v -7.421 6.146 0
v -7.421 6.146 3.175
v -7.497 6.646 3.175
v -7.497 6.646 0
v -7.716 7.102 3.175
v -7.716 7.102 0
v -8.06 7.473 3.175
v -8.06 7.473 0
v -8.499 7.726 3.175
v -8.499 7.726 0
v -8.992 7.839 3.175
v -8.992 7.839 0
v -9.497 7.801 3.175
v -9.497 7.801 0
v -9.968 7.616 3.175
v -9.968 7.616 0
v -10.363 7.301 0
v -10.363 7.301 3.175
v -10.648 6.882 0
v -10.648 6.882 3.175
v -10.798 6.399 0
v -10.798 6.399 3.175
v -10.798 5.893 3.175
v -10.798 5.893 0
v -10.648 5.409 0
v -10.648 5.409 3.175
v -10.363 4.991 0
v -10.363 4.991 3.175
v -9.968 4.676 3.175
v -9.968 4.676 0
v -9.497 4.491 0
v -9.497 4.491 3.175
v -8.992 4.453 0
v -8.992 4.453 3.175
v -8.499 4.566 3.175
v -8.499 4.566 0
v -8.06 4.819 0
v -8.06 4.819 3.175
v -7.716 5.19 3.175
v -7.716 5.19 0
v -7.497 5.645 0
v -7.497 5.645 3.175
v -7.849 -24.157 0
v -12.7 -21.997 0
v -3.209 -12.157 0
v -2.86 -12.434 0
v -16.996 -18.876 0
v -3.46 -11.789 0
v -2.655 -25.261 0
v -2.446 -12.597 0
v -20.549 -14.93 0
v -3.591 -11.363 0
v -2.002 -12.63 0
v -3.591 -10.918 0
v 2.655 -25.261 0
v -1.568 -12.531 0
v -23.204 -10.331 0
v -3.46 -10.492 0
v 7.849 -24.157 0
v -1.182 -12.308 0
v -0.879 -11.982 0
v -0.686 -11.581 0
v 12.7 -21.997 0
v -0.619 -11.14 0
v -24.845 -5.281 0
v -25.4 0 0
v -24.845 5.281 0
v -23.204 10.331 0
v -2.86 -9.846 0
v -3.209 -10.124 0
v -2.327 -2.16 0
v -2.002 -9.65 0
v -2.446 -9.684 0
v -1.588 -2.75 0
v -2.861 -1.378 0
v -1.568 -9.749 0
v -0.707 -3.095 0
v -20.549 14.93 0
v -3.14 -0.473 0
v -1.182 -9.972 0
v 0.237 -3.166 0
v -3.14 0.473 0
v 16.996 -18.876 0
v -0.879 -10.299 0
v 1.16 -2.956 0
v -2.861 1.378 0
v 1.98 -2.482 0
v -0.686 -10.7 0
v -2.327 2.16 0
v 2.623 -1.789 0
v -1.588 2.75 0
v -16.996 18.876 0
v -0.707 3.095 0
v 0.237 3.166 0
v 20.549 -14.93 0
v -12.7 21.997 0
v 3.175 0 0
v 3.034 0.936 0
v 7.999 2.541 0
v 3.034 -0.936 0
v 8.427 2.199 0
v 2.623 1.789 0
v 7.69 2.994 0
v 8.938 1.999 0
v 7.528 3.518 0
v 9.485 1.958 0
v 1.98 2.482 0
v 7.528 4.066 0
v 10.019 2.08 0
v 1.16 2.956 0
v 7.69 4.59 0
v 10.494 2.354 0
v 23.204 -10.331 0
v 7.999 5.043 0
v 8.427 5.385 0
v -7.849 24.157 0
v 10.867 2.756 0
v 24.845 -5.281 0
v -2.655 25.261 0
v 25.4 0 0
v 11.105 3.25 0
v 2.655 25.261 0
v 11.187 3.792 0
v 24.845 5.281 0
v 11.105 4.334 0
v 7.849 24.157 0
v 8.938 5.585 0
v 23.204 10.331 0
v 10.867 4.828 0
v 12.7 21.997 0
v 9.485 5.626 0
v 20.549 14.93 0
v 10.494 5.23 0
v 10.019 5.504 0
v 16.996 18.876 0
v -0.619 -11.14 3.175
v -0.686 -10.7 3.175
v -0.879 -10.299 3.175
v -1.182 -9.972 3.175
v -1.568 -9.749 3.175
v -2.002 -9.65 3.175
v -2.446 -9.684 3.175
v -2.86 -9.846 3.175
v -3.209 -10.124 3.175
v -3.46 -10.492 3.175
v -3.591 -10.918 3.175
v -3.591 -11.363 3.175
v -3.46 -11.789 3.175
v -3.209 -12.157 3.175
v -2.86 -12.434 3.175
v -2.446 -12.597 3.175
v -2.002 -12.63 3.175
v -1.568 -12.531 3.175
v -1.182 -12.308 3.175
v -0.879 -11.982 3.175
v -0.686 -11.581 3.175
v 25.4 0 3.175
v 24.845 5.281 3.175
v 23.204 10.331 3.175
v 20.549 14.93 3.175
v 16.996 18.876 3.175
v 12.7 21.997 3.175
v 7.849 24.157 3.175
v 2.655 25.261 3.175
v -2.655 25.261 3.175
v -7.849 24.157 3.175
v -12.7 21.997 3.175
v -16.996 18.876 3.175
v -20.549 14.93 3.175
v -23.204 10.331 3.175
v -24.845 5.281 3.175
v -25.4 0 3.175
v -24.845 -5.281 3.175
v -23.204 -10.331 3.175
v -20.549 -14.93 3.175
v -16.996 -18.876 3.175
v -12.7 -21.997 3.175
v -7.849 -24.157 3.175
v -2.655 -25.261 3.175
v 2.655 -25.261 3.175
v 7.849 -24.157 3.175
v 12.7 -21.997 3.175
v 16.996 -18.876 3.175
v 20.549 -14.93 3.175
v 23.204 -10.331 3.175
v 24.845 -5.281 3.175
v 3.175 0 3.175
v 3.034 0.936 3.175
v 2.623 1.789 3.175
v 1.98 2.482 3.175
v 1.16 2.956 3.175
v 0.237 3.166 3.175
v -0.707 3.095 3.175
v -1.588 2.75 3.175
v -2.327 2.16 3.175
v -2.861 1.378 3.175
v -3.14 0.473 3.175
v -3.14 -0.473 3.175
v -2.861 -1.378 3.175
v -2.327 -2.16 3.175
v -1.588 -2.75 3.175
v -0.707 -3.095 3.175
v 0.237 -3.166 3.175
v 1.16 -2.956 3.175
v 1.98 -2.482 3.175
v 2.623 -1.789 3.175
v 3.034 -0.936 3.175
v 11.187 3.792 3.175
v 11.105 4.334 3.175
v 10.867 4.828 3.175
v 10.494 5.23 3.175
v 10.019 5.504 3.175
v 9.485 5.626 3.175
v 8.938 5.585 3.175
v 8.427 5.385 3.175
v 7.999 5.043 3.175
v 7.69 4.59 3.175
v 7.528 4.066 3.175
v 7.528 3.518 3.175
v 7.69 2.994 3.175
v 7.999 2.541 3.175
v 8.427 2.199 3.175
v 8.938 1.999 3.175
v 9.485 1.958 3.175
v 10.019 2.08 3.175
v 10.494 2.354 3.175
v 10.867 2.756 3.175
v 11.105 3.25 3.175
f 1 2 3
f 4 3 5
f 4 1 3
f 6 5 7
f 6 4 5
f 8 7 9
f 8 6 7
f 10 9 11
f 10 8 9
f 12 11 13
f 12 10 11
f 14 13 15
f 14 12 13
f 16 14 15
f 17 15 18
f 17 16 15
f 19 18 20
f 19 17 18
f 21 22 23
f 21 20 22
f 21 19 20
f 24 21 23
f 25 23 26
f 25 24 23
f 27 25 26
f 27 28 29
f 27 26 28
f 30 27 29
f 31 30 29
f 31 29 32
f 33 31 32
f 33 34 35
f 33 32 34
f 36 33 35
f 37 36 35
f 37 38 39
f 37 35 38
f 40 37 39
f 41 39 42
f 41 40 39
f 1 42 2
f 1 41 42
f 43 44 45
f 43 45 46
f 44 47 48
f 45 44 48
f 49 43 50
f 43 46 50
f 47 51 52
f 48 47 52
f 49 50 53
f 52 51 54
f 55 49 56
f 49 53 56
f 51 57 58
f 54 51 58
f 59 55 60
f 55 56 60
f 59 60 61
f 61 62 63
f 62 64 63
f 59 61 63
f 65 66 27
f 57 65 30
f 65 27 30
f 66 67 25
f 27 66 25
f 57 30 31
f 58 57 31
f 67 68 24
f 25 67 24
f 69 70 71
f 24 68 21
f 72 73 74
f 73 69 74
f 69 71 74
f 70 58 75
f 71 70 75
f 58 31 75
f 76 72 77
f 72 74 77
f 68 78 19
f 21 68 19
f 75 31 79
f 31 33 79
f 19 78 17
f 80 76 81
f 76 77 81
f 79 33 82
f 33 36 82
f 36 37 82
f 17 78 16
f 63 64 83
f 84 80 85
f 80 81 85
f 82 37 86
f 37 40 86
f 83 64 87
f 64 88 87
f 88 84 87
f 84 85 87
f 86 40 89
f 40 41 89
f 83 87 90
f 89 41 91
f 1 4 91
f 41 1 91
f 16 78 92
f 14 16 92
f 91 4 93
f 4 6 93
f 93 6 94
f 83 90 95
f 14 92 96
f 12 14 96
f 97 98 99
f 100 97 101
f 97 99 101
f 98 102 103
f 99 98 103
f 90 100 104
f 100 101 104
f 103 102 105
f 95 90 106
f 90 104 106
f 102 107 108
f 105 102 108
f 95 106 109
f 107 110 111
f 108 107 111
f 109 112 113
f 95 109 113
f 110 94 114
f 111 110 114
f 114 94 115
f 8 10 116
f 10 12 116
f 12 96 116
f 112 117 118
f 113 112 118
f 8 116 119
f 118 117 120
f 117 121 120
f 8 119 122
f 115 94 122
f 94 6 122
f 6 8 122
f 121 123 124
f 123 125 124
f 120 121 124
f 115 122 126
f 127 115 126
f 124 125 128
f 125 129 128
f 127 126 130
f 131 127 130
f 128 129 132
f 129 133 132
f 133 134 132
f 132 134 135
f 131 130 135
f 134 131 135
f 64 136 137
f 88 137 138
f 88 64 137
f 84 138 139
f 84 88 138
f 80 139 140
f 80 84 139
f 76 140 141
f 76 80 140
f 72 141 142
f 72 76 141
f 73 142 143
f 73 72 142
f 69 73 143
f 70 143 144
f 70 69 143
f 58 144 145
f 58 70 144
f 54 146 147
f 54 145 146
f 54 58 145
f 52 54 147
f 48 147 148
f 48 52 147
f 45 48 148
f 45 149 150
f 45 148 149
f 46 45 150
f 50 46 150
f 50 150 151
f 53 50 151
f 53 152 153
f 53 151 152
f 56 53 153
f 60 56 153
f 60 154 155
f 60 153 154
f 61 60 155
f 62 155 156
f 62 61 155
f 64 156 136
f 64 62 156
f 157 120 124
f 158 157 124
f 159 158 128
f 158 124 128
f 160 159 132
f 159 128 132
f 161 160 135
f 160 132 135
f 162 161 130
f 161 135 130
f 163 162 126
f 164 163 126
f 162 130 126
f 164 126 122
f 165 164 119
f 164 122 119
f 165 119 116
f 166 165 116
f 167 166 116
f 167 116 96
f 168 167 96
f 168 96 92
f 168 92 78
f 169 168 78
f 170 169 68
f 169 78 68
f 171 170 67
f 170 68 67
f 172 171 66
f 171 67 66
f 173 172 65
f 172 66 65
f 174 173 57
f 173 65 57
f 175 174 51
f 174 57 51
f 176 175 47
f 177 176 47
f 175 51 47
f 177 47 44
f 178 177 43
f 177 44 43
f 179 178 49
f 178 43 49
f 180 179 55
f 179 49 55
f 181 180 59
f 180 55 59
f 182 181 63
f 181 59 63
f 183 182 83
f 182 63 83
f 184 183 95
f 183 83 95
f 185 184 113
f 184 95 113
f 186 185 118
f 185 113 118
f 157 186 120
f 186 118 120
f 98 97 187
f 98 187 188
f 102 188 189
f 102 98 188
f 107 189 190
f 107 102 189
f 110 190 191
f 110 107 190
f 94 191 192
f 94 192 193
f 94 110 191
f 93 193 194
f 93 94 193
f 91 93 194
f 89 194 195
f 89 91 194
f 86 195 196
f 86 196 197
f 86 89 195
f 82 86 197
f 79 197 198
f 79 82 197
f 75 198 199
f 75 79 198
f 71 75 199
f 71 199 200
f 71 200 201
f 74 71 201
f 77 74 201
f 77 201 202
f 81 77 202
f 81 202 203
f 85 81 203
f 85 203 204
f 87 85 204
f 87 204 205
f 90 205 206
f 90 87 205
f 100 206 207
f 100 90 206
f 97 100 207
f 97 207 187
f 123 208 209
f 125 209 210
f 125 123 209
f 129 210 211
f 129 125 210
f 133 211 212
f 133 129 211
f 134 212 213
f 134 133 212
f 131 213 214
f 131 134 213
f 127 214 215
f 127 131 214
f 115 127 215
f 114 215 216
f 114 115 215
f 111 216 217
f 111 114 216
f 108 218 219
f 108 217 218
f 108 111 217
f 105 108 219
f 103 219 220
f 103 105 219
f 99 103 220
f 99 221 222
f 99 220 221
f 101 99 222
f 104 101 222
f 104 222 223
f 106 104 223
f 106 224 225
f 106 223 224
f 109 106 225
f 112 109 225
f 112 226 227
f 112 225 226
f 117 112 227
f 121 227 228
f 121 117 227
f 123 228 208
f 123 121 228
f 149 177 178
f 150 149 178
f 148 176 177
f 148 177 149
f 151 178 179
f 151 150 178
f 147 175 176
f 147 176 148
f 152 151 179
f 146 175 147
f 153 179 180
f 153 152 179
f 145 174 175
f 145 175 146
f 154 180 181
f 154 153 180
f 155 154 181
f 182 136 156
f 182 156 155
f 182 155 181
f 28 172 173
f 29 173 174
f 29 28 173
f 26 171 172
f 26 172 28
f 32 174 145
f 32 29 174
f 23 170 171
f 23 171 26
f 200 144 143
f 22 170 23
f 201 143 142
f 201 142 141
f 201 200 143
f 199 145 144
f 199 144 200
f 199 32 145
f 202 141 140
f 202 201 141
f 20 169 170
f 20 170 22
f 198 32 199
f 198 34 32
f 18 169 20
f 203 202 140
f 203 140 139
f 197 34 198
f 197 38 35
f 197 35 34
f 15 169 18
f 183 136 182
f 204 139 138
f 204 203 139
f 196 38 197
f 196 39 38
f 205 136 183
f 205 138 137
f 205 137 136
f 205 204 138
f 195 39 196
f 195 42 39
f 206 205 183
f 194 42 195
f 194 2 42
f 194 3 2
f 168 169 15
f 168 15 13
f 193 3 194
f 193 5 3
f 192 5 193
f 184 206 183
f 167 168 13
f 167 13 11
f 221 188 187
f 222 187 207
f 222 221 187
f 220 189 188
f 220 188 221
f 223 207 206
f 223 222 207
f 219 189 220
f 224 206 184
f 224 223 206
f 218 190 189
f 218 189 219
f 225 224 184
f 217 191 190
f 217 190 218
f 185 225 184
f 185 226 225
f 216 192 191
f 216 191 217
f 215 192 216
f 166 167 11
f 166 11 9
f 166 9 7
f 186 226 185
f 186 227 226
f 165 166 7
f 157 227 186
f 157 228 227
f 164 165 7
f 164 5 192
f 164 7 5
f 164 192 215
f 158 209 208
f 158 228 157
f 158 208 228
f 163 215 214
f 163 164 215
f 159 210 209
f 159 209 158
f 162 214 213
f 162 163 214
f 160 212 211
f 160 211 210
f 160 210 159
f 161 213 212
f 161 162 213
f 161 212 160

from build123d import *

# Parameters (mm, degrees)
SKETCH1_R           = 25.4
SKETCH1_R_2         = 3.175
BOSS_EXTRUDE1_DEPTH = 3.175
ATTACHMENTHOLES_R   = 1.697640298
ATTACHMENTHOLES_R_2 = 1.839394333
ATTACHMENTHOLES_R_3 = 1.494089935
CUT_EXTRUDE1_DEPTH  = 37.061067996


with BuildPart() as part:
    # Sketch1 → Boss-Extrude1 (new body)
    with BuildSketch(Plane.XY):
        Circle(SKETCH1_R)
        Circle(SKETCH1_R_2, mode=Mode.SUBTRACT)
    extrude(amount=BOSS_EXTRUDE1_DEPTH)

    # AttachmentHoles → Cut-Extrude1 (cut, through all)
    with BuildSketch(Plane.XY):
        with Locations((-9.118891252, 6.145879466)):
            Circle(ATTACHMENTHOLES_R)
        with Locations((9.347171253, 3.791989153)):
            Circle(ATTACHMENTHOLES_R_2)
        with Locations((-2.113411396, -11.140283228)):
            Circle(ATTACHMENTHOLES_R_3)
    extrude(amount=CUT_EXTRUDE1_DEPTH, mode=Mode.SUBTRACT)


solid = part.part
